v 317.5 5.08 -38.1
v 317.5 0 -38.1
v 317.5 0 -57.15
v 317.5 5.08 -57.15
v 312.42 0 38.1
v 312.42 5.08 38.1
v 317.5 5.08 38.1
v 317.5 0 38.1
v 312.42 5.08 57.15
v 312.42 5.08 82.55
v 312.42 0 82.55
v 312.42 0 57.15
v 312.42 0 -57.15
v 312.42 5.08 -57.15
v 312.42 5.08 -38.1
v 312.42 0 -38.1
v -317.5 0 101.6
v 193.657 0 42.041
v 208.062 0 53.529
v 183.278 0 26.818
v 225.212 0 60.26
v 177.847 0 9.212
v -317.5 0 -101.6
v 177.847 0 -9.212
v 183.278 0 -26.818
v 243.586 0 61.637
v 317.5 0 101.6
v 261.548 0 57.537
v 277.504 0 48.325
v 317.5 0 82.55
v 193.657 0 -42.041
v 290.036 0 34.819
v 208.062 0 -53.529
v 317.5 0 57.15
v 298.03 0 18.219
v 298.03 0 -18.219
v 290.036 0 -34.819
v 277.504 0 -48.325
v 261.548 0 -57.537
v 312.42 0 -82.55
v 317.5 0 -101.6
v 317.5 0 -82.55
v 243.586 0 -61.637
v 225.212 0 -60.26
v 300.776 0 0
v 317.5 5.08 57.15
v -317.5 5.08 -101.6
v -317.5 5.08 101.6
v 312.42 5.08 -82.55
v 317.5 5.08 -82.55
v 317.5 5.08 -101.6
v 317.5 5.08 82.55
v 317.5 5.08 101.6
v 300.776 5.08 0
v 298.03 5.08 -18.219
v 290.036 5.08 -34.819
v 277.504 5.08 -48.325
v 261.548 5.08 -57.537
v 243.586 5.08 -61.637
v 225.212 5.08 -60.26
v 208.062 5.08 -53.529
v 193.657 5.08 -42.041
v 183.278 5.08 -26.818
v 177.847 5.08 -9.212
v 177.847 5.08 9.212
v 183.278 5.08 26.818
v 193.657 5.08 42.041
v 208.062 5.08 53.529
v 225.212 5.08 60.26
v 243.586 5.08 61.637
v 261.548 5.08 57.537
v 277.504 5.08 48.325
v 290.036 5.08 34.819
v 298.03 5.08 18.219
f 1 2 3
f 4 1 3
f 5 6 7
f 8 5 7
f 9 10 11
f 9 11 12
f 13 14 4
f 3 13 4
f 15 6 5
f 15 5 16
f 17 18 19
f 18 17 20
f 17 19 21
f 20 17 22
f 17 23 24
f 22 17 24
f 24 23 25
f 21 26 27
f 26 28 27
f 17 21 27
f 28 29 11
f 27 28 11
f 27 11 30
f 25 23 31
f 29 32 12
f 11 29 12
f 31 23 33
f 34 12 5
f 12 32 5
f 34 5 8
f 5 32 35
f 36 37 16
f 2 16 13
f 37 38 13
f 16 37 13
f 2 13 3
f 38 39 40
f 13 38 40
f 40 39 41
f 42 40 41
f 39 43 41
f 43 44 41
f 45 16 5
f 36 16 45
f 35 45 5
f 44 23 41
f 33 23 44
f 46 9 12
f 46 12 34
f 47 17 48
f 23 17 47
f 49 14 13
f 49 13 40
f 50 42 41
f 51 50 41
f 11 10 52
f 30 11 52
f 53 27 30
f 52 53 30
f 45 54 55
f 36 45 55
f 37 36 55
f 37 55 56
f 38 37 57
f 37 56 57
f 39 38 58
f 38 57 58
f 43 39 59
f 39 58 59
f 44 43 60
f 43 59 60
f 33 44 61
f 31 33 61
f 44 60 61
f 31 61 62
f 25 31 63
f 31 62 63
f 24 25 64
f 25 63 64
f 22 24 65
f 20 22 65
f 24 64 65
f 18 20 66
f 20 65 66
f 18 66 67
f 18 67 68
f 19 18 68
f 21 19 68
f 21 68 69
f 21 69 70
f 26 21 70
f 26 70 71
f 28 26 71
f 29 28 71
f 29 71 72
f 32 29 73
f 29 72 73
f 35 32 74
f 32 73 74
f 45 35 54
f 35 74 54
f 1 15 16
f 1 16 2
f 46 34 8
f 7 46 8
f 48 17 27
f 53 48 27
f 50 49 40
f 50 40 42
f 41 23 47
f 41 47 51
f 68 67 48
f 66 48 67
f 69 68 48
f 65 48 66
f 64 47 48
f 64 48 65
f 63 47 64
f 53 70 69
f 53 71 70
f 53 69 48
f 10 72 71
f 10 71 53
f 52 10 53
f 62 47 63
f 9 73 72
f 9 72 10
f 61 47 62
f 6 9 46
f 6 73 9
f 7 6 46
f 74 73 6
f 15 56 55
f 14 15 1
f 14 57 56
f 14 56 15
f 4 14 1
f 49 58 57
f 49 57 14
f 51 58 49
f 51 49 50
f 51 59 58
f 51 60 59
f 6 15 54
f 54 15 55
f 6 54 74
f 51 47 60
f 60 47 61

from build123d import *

# Parameters (mm, degrees)
SKETCH1_W           = 635
SKETCH1_H           = 203.2
BOSS_EXTRUDE1_DEPTH = 5.08
SKETCH2_W           = 5.08
SKETCH2_H           = 25.4
SKETCH2_H_2         = 76.2
CUT_EXTRUDE1_DEPTH  = 5.08
SKETCH3_R           = 61.809841791
CUT_EXTRUDE2_DEPTH  = 5.08


with BuildPart() as part:
    # Sketch1 → Boss-Extrude1 (new body)
    with BuildSketch(Plane(origin=(0, 0, 0), x_dir=(1, 0, 0), z_dir=(0, 1, 0))):
        Rectangle(SKETCH1_W, SKETCH1_H)
    extrude(amount=BOSS_EXTRUDE1_DEPTH)

    # Sketch2 → Cut-Extrude1 (cut)
    with BuildSketch(Plane(origin=(0, 5.08, 0), x_dir=(1, 0, 0), z_dir=(0, 1, 0))):
        with Locations((314.96, 69.85)):
            Rectangle(SKETCH2_W, SKETCH2_H)
        with Locations((314.96, -69.85)):
            Rectangle(SKETCH2_W, SKETCH2_H)
        with Locations((314.96, 0)):
            Rectangle(SKETCH2_W, SKETCH2_H_2)
    extrude(amount=-CUT_EXTRUDE1_DEPTH, mode=Mode.SUBTRACT)

    # Sketch3 → Cut-Extrude2 (cut)
    with BuildSketch(Plane(origin=(0, 5.08, 0), x_dir=(1, 0, 0), z_dir=(0, 1, 0))):
        with Locations((238.966470336, 0)):
            Circle(SKETCH3_R)
    extrude(amount=-CUT_EXTRUDE2_DEPTH, mode=Mode.SUBTRACT)


solid = part.part
